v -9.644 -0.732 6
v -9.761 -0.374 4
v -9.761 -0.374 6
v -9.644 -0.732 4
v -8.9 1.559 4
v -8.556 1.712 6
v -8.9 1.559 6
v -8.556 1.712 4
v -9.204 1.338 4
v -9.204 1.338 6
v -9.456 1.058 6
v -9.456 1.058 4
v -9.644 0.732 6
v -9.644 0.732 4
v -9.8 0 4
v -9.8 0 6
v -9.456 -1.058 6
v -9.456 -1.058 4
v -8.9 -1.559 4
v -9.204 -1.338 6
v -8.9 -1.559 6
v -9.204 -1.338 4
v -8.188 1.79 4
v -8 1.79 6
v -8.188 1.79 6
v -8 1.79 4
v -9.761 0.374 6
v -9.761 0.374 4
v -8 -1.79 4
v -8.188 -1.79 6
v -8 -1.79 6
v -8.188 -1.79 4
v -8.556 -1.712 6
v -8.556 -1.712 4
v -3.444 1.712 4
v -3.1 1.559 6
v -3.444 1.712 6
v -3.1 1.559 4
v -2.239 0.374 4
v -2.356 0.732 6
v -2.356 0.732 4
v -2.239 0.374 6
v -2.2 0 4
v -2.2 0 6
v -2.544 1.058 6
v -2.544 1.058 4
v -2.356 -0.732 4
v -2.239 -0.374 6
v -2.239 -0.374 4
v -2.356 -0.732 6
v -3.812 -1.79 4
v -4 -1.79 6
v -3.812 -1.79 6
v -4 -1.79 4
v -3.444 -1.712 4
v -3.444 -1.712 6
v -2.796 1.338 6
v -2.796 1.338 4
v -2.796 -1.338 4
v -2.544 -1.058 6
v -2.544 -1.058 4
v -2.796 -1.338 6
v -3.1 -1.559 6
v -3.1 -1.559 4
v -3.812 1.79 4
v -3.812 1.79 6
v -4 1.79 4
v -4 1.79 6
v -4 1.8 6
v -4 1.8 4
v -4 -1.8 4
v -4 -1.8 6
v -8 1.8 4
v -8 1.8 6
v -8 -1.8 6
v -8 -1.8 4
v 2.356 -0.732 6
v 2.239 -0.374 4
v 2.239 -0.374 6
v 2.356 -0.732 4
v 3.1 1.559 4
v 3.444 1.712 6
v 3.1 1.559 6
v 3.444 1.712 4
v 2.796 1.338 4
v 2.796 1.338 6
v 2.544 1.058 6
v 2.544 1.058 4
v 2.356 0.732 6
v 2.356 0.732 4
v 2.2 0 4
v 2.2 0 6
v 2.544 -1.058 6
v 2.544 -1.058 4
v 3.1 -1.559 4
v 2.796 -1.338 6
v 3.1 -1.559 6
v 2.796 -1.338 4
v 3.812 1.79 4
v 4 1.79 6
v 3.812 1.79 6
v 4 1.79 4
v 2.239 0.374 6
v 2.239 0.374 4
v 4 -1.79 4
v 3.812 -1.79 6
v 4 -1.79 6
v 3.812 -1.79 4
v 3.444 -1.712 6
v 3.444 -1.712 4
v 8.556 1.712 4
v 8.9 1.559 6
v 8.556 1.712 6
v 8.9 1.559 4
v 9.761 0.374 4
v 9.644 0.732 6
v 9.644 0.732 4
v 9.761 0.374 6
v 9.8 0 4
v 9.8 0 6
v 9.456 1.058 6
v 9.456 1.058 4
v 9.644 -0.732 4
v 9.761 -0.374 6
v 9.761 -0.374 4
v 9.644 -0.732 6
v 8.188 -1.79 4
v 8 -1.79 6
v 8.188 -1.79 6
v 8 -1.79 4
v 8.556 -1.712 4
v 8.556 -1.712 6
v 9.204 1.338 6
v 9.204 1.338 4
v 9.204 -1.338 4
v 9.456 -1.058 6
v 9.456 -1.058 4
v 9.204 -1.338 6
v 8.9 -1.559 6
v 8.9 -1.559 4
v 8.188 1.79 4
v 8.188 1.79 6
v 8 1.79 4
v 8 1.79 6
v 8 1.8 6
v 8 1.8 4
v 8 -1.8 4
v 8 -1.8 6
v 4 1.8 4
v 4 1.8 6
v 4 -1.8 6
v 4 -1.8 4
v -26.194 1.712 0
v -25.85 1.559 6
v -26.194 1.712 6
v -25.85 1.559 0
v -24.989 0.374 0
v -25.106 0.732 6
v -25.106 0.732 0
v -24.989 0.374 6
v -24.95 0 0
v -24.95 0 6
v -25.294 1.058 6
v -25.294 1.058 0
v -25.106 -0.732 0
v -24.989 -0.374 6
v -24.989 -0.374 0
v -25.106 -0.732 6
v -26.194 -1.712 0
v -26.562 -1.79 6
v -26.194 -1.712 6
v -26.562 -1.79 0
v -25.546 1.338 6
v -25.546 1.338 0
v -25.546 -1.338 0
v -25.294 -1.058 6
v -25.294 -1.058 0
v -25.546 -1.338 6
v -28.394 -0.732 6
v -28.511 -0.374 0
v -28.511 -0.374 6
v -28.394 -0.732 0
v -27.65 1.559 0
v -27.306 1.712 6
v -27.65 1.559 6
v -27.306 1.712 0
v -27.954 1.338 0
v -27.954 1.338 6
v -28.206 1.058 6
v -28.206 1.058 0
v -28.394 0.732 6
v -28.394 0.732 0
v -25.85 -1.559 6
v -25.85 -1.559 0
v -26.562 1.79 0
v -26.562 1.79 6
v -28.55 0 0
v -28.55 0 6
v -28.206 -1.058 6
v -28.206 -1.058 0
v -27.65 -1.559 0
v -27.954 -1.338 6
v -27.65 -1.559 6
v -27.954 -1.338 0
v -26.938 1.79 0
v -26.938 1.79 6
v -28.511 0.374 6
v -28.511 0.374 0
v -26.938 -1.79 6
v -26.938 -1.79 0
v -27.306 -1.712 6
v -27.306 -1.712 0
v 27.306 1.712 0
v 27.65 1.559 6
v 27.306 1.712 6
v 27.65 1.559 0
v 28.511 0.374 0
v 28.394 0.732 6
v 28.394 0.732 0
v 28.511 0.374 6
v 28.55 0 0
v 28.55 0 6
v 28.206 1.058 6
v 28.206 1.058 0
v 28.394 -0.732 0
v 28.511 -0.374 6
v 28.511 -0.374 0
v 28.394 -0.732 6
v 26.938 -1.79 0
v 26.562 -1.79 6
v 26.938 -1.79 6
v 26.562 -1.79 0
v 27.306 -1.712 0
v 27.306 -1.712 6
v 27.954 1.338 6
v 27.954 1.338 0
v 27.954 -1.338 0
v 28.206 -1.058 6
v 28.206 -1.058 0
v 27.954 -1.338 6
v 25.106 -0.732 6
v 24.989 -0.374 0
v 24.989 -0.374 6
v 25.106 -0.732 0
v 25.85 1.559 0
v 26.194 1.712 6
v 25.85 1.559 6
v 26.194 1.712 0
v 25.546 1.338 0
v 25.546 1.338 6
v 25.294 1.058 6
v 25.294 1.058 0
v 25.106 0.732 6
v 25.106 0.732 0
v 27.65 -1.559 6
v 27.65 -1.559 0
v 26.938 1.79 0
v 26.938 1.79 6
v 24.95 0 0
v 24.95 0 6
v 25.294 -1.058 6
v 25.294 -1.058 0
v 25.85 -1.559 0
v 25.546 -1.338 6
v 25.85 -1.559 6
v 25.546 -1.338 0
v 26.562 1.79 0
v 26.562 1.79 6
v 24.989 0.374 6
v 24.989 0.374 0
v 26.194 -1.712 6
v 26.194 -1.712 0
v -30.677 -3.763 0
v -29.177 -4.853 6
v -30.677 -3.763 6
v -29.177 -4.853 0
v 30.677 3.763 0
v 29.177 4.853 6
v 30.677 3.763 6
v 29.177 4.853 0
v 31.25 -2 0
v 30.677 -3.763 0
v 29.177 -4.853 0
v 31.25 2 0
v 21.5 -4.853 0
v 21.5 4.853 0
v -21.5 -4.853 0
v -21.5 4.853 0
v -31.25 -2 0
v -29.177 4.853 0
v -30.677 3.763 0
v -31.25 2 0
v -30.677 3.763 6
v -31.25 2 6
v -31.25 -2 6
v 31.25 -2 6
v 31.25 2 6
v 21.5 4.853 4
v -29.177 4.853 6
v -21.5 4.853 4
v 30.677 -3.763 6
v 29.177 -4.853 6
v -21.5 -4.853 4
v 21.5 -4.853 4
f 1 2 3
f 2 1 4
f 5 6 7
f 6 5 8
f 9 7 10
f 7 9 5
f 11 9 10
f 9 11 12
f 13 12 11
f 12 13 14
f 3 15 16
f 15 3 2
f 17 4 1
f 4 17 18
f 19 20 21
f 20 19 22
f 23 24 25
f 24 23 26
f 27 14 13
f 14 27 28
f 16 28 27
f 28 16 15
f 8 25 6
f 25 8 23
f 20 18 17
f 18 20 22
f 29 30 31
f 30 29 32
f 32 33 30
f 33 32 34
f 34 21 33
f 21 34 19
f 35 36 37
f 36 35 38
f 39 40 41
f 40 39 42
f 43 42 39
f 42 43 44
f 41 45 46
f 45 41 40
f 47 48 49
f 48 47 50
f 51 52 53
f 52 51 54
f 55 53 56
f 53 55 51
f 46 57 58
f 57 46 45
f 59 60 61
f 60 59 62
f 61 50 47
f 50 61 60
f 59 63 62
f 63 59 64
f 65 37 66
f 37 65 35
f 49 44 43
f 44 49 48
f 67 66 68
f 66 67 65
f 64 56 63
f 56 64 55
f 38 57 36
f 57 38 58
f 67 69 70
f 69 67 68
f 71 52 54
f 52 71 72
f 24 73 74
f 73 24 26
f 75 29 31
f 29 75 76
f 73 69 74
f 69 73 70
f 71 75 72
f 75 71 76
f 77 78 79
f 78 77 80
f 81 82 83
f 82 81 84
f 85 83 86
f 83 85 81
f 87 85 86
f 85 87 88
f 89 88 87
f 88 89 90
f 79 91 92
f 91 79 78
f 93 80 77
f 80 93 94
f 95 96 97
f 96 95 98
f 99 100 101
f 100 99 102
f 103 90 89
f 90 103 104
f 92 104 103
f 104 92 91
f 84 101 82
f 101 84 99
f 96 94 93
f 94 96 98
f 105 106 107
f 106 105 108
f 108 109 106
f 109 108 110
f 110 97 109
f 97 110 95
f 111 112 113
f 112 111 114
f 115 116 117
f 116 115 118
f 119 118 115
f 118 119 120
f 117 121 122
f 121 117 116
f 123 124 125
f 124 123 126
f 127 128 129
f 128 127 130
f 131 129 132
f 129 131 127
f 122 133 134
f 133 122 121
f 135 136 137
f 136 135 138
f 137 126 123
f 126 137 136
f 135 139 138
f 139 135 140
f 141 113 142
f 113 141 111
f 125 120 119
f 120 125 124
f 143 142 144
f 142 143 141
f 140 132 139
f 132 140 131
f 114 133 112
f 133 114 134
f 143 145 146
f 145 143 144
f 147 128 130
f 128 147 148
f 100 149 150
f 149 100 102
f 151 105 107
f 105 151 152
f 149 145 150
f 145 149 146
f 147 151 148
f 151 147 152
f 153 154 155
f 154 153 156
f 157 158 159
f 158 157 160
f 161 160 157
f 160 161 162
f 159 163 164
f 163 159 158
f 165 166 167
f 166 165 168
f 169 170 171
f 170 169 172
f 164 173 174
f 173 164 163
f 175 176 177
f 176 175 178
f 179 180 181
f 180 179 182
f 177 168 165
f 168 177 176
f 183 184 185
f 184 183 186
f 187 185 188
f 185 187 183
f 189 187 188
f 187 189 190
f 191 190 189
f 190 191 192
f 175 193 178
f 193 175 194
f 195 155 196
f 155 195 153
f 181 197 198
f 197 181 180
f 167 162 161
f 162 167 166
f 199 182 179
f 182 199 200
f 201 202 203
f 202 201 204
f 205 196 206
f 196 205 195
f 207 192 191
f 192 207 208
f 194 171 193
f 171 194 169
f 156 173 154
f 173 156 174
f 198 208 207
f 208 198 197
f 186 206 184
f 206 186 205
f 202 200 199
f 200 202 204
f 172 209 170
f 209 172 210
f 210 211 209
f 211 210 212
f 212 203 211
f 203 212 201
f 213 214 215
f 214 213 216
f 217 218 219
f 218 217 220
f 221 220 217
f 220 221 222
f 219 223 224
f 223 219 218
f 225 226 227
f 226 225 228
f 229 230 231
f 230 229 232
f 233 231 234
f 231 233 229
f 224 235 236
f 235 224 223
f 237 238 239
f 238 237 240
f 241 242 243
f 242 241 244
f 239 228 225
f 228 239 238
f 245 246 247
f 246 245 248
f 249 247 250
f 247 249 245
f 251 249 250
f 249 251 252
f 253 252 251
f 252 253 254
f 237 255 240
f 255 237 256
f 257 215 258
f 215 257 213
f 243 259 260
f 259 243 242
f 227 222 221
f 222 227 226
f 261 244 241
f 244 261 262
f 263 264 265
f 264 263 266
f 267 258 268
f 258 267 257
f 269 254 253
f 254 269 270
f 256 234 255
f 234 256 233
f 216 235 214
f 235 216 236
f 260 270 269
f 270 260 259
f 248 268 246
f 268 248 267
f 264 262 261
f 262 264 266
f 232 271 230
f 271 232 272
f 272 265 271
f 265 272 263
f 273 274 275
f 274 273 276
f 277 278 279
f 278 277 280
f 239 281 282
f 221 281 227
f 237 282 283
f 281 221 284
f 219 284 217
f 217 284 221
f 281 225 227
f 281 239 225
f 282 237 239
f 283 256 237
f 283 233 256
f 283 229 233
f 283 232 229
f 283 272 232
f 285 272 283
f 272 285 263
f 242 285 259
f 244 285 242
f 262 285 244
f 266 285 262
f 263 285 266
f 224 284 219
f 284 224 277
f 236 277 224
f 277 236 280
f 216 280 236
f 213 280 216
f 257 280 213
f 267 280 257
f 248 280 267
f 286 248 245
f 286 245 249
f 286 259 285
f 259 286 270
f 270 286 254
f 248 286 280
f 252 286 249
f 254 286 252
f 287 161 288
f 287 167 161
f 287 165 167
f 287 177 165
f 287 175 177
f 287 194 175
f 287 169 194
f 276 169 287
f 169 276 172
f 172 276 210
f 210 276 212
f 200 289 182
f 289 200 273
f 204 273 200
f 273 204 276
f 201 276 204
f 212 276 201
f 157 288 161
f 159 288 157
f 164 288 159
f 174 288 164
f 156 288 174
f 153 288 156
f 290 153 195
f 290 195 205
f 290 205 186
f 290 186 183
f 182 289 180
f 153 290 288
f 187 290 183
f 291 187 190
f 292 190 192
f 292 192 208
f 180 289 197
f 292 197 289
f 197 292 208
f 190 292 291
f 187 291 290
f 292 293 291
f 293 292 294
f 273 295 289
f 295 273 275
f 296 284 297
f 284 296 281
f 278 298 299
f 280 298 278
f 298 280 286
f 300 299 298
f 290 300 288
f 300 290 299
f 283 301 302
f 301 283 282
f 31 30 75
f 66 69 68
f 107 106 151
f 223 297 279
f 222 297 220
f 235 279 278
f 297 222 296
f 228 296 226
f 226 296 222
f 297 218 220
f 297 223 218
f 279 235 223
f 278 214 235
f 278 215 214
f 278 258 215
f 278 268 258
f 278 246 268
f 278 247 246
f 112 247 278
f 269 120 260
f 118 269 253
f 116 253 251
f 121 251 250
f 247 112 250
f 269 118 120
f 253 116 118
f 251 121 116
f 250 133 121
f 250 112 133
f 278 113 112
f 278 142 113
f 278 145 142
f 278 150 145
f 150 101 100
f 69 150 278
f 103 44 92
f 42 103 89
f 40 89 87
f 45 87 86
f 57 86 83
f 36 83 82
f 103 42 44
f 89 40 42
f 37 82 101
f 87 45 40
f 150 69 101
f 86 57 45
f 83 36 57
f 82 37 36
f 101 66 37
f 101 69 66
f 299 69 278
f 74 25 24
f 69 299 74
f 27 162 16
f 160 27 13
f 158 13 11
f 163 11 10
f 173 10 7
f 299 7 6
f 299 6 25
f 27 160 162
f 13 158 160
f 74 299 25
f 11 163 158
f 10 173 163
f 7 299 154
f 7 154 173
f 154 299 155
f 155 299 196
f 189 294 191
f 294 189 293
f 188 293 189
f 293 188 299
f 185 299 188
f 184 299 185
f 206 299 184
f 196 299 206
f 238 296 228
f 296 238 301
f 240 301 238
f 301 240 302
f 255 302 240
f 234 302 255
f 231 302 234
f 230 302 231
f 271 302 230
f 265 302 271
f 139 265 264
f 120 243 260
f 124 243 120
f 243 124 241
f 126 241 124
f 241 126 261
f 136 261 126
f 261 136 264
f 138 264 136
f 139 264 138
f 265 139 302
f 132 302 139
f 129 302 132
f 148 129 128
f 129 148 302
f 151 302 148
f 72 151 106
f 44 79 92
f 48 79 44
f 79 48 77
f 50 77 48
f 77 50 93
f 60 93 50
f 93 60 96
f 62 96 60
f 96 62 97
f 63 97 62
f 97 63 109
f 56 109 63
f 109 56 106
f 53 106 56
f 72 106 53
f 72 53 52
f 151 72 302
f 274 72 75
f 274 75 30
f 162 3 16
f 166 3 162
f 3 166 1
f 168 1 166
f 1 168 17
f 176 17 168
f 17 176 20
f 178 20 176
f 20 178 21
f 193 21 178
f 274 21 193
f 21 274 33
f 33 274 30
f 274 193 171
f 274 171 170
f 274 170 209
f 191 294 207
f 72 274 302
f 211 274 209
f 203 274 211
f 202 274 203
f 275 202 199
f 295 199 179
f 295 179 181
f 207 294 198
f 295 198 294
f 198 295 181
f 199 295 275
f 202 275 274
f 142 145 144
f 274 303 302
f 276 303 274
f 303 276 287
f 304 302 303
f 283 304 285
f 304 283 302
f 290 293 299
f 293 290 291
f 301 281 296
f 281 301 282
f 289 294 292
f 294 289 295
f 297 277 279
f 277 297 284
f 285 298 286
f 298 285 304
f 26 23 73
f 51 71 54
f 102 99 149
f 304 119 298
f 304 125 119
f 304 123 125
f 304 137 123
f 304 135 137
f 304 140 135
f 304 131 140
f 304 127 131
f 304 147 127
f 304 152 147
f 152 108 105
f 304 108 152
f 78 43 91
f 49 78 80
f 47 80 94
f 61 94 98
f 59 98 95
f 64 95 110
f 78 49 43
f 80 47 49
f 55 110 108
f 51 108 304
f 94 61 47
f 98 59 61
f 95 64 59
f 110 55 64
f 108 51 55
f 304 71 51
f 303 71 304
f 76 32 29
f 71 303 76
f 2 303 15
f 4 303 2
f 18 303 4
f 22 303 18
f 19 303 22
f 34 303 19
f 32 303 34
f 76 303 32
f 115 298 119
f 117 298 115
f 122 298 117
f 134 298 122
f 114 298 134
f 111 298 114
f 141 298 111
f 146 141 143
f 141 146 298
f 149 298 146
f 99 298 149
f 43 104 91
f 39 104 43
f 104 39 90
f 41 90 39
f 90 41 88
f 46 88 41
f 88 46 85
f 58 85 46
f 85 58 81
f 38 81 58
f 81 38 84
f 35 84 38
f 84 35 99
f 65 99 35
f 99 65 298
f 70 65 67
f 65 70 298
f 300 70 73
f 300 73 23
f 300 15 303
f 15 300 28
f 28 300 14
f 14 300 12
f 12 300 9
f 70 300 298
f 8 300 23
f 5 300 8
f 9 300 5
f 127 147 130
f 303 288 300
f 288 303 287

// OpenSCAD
// file: dronePlates.scad
/**
 * dronePlates.scad
 * Plate library
 *
 * GNU GPL V3
 * @author: Victor Potenciano
 */

m3Rad = 3.4/2;
cornerR = 4;

/**
 *
 */
module helperDisk(diameter) {
	cylinder(r = diameter/2, h = 0.6, $fn=20);
}

/**
 *
 */
module roundedRect(size, radius) {
	x = size[0];
	y = size[1];
	z = size[2];

	linear_extrude(height=z)
	hull() {
	// place 4 circles in the corners, with the given radius
	translate([(-x/2)+(radius/2), (-y/2)+(radius/2), 0]){ circle(r=radius); }
	translate([(x/2)-(radius/2), (-y/2)+(radius/2), 0]){ circle(r=radius); }
	translate([(-x/2)+(radius/2), (y/2)-(radius/2), 0]){ circle(r=radius); }
	translate([(x/2)-(radius/2), (y/2)-(radius/2), 0]){ circle(r=radius); }
	}
}

/**
 * rounded rectangle triangle with corner at origin
 */
module roundedTriangle(size, radius) {
	x = size[0];
	y = size[1];
	z = size[2];

	linear_extrude(height=z)
	hull() {
	translate([radius, radius, 0]){ circle(r=radius); }
	translate([x-radius, radius, 0]){ circle(r=radius); }
	translate([radius, y-radius, 0]){ circle(r=radius); }
	}
}

/**
 *
 */
module roundRectPlate(w, l, plateThick=3) {
	difference(){
		roundedRect([l+m3Rad*1.75,w+m3Rad*1.75,plateThick], cornerR);
		translate([l/2, w/2, -0.5]) { cylinder(h = plateThick+1, r = m3Rad, $fn=30); }
		translate([-l/2, w/2, -0.5]) { cylinder(h = plateThick+1, r = m3Rad, $fn=30); }
		translate([l/2, -w/2, -0.5]) { cylinder(h = plateThick+1, r = m3Rad, $fn=30); }
		translate([-l/2, -w/2, -0.5]) { cylinder(h = plateThick+1, r = m3Rad, $fn=30); }
	}
}

/**
 *
 */
module crossSquarePlate(l, thick=3) {
	inDist = cornerR*2+4;
	trianL = sqrt((l*l)/2)-inDist;
	centerR = 4;

	difference(){
		roundRectPlate(l, l, thick);
		translate([0, centerR, -0.5]) { 
			rotate([0,0,45]){ roundedTriangle([trianL,trianL,thick+1], cornerR-2); }
		}
		translate([0, -centerR, -0.5]) { 
			rotate([0,0,225]){ roundedTriangle([trianL,trianL,thick+1], cornerR-2); }
		}
		translate([-centerR, 0, -0.5]) { 
			rotate([0,0,135]){ roundedTriangle([trianL,trianL,thick+1], cornerR-2); }
		}
		translate([centerR, 0, -0.5]) { 
			rotate([0,0,-45]){ roundedTriangle([trianL,trianL,thick+1], cornerR-2); }
		}
	}
}

/**
 *
 */
module hShapePlate(w, l, thick=4) {
	inDist = cornerR*2+1;

	difference(){
		roundRectPlate(w, l, thick);
		translate([0, w/4, -0.5]) { roundedRect([l-inDist,w/2-inDist,thick+1], cornerR-2); }
		translate([0, -w/4, -0.5]) { roundedRect([l-inDist,w/2-inDist,thick+1], cornerR-2); }
	}
}

/**
 *
 */
module motorCircleMount(inDia, outDia, thick=3, extraH=false, d1=19, d2=16, holeR=m3Rad ) {
	difference(){
		cylinder(h = thick, r = outDia/2, $fn=30);
		motorCircleMountHoles(inDia, outDia, thick, extraH, d1=d1, d2=d2, holeR=holeR);
	}
}

/**
 *
 */
module motorCircleMountHoles(inDia, outDia, thick=3, extraH=false, d1=19, d2=16, d3=25, holeR=m3Rad) {
	translate([0, 0, -0.5]) { cylinder(h = thick+1, r = inDia/2, $fn=30); }

	for(i=[0:3]) {
		rotate([0,0,90*i]){
		translate([d1/2, 0, -0.5]) cylinder(h = thick+1, r = holeR, $fn=20);
		translate([d2/2, 0, -0.5]) cylinder(h = thick+1, r = holeR, $fn=20);
		translate([d2/2, -holeR, -0.5]) cube(size = [(d1-d2)/2,holeR*2,thick+1]);
		}
	}
	
	if(extraH==true){	
		for(i=[-1,1]) translate([i*d3/2, 0, -0.5]) { cylinder(h = thick+1, r = holeR, $fn=30); }
	}
}

/**
 *
 */
module motorRectMount(w, l, inDia, thick=3) {
	d1=19;
	d2=16;

	difference(){
		roundRectPlate(w, l, thick);
		translate([0, 0, -0.5]) { cylinder(h = thick+1, r = inDia/2, $fn=30); }
		translate([0, d1/2, -0.5]) { cylinder(h = thick+1, r = m3Rad, $fn=30); }
		translate([0, -d1/2, -0.5]) { cylinder(h = thick+1, r = m3Rad, $fn=30); }
		translate([d2/2, 0, -0.5]) { cylinder(h = thick+1, r = m3Rad, $fn=30); }
		translate([-d2/2, 0, -0.5]) { cylinder(h = thick+1, r = m3Rad, $fn=30); }
	}
}

/**
 *
 */
module tube(inDia, outDia, height) {
	difference(){
		cylinder(h = height, r = outDia/2, $fn=50);
		translate([0, 0, -0.5]) { cylinder(h = height+1, r = inDia/2, $fn=30); }
	}
}

/**
 *
 */
module squareTube(inDia, outDia, height) {
	translate([0,0,height/2]){
	difference(){
		cube(size = [outDia,outDia,height], center = true);
		cube(size = [inDia,inDia,height+1], center = true);
	}
	}
}

/**
 *
 */
module djiFlamewheelHoles(height) {
	a = 23;
	b = 16;
	c = 19.5;
	
	translate([a/2, c/2, 0]) { cylinder(h = height, r = m3Rad, $fn=30); }
	translate([-a/2, c/2, 0]) { cylinder(h = height, r = m3Rad, $fn=30); }
	translate([b/2, -c/2, 0]) { cylinder(h = height, r = m3Rad, $fn=30); }
	translate([-b/2, -c/2, 0]) { cylinder(h = height, r = m3Rad, $fn=30); }
}

/**
 *
 */
module djiFlamewheelHolesBotton(height) {
	a1 = 21;
	c = 19.5;
	
	translate([a1/2, c/2, 0]) { cylinder(h = height, r = m3Rad, $fn=30); }
	translate([-a1/2, c/2, 0]) { cylinder(h = height, r = m3Rad, $fn=30); }
}

/**
 *
 */
module propeller(size){
union(){
difference(){
	cylinder(h = 3, r = size/2, center=true, $fn=30);
	cylinder(h = 3.1, r = size/2-2, center=true, $fn=30); 
}
for( i = [-1,1] ){
rotate([0,0,45*i]){ cube(size = [size,4,1], center = true); }
}
}
}

/**
 *
 */
module slot(length, height, rad){
for(i=[-1,1]) translate([i*length/2,0,0]) cylinder(h = height, r = rad, $fn=30);
translate([0,0,height/2]) cube(size = [length,rad*2,height], center = true);
}

 

////////////////////////
// Examples:
////////////////////////

motorCircleMount(8, 25, 3.5);

//roundedRect([50,50,3], 4);

//hShapePlate(79, 25);

//rotate([0,0,45]){roundedTriangle([40,40,3], 4);}

//crossSquarePlate(45, 4);

/*
union(){
motorRectMount(21, 18, 8, 4);
translate([9, 10.5, 0]) {tube(m3Rad*2, 6.5, 6);}
}
*/

/*
difference(){
union(){
hShapePlate(50, 30, 3.5);
translate([-4,-25,0]){cube(size = [8,50,3.5]);}
rotate([0, 0, 45]) {motorCircleMount(8, 35, 3.5);}
}
cylinder(h = 10, r = 4, $fn=100, center=true);
}
*/

//rotate([90,0,0]){ tube(5,10,20); }
//translate([20,0,0]){ squareTube(5, 10, 20); }
// main file
/**
 * cinetank plate for zip-tie fpv cam mount
 */

use <dronePlates.scad>

m3Rad = 3.6/2;
plateThick = 6;
holeDist=53.5;

difference() {

union(){
roundedRect([holeDist+6,7,plateThick], 3);

}//union

translate([-21.5,-5,-0.5]) cube([43,10,4.5]);

for(i=[-1,1]){
translate([i*6,0,-0.5]) slot(4, 10, m3Rad);
translate([i*holeDist/2,0,-0.5]) cylinder(h = plateThick+1, r = m3Rad, $fn=30);
}

} //diff
